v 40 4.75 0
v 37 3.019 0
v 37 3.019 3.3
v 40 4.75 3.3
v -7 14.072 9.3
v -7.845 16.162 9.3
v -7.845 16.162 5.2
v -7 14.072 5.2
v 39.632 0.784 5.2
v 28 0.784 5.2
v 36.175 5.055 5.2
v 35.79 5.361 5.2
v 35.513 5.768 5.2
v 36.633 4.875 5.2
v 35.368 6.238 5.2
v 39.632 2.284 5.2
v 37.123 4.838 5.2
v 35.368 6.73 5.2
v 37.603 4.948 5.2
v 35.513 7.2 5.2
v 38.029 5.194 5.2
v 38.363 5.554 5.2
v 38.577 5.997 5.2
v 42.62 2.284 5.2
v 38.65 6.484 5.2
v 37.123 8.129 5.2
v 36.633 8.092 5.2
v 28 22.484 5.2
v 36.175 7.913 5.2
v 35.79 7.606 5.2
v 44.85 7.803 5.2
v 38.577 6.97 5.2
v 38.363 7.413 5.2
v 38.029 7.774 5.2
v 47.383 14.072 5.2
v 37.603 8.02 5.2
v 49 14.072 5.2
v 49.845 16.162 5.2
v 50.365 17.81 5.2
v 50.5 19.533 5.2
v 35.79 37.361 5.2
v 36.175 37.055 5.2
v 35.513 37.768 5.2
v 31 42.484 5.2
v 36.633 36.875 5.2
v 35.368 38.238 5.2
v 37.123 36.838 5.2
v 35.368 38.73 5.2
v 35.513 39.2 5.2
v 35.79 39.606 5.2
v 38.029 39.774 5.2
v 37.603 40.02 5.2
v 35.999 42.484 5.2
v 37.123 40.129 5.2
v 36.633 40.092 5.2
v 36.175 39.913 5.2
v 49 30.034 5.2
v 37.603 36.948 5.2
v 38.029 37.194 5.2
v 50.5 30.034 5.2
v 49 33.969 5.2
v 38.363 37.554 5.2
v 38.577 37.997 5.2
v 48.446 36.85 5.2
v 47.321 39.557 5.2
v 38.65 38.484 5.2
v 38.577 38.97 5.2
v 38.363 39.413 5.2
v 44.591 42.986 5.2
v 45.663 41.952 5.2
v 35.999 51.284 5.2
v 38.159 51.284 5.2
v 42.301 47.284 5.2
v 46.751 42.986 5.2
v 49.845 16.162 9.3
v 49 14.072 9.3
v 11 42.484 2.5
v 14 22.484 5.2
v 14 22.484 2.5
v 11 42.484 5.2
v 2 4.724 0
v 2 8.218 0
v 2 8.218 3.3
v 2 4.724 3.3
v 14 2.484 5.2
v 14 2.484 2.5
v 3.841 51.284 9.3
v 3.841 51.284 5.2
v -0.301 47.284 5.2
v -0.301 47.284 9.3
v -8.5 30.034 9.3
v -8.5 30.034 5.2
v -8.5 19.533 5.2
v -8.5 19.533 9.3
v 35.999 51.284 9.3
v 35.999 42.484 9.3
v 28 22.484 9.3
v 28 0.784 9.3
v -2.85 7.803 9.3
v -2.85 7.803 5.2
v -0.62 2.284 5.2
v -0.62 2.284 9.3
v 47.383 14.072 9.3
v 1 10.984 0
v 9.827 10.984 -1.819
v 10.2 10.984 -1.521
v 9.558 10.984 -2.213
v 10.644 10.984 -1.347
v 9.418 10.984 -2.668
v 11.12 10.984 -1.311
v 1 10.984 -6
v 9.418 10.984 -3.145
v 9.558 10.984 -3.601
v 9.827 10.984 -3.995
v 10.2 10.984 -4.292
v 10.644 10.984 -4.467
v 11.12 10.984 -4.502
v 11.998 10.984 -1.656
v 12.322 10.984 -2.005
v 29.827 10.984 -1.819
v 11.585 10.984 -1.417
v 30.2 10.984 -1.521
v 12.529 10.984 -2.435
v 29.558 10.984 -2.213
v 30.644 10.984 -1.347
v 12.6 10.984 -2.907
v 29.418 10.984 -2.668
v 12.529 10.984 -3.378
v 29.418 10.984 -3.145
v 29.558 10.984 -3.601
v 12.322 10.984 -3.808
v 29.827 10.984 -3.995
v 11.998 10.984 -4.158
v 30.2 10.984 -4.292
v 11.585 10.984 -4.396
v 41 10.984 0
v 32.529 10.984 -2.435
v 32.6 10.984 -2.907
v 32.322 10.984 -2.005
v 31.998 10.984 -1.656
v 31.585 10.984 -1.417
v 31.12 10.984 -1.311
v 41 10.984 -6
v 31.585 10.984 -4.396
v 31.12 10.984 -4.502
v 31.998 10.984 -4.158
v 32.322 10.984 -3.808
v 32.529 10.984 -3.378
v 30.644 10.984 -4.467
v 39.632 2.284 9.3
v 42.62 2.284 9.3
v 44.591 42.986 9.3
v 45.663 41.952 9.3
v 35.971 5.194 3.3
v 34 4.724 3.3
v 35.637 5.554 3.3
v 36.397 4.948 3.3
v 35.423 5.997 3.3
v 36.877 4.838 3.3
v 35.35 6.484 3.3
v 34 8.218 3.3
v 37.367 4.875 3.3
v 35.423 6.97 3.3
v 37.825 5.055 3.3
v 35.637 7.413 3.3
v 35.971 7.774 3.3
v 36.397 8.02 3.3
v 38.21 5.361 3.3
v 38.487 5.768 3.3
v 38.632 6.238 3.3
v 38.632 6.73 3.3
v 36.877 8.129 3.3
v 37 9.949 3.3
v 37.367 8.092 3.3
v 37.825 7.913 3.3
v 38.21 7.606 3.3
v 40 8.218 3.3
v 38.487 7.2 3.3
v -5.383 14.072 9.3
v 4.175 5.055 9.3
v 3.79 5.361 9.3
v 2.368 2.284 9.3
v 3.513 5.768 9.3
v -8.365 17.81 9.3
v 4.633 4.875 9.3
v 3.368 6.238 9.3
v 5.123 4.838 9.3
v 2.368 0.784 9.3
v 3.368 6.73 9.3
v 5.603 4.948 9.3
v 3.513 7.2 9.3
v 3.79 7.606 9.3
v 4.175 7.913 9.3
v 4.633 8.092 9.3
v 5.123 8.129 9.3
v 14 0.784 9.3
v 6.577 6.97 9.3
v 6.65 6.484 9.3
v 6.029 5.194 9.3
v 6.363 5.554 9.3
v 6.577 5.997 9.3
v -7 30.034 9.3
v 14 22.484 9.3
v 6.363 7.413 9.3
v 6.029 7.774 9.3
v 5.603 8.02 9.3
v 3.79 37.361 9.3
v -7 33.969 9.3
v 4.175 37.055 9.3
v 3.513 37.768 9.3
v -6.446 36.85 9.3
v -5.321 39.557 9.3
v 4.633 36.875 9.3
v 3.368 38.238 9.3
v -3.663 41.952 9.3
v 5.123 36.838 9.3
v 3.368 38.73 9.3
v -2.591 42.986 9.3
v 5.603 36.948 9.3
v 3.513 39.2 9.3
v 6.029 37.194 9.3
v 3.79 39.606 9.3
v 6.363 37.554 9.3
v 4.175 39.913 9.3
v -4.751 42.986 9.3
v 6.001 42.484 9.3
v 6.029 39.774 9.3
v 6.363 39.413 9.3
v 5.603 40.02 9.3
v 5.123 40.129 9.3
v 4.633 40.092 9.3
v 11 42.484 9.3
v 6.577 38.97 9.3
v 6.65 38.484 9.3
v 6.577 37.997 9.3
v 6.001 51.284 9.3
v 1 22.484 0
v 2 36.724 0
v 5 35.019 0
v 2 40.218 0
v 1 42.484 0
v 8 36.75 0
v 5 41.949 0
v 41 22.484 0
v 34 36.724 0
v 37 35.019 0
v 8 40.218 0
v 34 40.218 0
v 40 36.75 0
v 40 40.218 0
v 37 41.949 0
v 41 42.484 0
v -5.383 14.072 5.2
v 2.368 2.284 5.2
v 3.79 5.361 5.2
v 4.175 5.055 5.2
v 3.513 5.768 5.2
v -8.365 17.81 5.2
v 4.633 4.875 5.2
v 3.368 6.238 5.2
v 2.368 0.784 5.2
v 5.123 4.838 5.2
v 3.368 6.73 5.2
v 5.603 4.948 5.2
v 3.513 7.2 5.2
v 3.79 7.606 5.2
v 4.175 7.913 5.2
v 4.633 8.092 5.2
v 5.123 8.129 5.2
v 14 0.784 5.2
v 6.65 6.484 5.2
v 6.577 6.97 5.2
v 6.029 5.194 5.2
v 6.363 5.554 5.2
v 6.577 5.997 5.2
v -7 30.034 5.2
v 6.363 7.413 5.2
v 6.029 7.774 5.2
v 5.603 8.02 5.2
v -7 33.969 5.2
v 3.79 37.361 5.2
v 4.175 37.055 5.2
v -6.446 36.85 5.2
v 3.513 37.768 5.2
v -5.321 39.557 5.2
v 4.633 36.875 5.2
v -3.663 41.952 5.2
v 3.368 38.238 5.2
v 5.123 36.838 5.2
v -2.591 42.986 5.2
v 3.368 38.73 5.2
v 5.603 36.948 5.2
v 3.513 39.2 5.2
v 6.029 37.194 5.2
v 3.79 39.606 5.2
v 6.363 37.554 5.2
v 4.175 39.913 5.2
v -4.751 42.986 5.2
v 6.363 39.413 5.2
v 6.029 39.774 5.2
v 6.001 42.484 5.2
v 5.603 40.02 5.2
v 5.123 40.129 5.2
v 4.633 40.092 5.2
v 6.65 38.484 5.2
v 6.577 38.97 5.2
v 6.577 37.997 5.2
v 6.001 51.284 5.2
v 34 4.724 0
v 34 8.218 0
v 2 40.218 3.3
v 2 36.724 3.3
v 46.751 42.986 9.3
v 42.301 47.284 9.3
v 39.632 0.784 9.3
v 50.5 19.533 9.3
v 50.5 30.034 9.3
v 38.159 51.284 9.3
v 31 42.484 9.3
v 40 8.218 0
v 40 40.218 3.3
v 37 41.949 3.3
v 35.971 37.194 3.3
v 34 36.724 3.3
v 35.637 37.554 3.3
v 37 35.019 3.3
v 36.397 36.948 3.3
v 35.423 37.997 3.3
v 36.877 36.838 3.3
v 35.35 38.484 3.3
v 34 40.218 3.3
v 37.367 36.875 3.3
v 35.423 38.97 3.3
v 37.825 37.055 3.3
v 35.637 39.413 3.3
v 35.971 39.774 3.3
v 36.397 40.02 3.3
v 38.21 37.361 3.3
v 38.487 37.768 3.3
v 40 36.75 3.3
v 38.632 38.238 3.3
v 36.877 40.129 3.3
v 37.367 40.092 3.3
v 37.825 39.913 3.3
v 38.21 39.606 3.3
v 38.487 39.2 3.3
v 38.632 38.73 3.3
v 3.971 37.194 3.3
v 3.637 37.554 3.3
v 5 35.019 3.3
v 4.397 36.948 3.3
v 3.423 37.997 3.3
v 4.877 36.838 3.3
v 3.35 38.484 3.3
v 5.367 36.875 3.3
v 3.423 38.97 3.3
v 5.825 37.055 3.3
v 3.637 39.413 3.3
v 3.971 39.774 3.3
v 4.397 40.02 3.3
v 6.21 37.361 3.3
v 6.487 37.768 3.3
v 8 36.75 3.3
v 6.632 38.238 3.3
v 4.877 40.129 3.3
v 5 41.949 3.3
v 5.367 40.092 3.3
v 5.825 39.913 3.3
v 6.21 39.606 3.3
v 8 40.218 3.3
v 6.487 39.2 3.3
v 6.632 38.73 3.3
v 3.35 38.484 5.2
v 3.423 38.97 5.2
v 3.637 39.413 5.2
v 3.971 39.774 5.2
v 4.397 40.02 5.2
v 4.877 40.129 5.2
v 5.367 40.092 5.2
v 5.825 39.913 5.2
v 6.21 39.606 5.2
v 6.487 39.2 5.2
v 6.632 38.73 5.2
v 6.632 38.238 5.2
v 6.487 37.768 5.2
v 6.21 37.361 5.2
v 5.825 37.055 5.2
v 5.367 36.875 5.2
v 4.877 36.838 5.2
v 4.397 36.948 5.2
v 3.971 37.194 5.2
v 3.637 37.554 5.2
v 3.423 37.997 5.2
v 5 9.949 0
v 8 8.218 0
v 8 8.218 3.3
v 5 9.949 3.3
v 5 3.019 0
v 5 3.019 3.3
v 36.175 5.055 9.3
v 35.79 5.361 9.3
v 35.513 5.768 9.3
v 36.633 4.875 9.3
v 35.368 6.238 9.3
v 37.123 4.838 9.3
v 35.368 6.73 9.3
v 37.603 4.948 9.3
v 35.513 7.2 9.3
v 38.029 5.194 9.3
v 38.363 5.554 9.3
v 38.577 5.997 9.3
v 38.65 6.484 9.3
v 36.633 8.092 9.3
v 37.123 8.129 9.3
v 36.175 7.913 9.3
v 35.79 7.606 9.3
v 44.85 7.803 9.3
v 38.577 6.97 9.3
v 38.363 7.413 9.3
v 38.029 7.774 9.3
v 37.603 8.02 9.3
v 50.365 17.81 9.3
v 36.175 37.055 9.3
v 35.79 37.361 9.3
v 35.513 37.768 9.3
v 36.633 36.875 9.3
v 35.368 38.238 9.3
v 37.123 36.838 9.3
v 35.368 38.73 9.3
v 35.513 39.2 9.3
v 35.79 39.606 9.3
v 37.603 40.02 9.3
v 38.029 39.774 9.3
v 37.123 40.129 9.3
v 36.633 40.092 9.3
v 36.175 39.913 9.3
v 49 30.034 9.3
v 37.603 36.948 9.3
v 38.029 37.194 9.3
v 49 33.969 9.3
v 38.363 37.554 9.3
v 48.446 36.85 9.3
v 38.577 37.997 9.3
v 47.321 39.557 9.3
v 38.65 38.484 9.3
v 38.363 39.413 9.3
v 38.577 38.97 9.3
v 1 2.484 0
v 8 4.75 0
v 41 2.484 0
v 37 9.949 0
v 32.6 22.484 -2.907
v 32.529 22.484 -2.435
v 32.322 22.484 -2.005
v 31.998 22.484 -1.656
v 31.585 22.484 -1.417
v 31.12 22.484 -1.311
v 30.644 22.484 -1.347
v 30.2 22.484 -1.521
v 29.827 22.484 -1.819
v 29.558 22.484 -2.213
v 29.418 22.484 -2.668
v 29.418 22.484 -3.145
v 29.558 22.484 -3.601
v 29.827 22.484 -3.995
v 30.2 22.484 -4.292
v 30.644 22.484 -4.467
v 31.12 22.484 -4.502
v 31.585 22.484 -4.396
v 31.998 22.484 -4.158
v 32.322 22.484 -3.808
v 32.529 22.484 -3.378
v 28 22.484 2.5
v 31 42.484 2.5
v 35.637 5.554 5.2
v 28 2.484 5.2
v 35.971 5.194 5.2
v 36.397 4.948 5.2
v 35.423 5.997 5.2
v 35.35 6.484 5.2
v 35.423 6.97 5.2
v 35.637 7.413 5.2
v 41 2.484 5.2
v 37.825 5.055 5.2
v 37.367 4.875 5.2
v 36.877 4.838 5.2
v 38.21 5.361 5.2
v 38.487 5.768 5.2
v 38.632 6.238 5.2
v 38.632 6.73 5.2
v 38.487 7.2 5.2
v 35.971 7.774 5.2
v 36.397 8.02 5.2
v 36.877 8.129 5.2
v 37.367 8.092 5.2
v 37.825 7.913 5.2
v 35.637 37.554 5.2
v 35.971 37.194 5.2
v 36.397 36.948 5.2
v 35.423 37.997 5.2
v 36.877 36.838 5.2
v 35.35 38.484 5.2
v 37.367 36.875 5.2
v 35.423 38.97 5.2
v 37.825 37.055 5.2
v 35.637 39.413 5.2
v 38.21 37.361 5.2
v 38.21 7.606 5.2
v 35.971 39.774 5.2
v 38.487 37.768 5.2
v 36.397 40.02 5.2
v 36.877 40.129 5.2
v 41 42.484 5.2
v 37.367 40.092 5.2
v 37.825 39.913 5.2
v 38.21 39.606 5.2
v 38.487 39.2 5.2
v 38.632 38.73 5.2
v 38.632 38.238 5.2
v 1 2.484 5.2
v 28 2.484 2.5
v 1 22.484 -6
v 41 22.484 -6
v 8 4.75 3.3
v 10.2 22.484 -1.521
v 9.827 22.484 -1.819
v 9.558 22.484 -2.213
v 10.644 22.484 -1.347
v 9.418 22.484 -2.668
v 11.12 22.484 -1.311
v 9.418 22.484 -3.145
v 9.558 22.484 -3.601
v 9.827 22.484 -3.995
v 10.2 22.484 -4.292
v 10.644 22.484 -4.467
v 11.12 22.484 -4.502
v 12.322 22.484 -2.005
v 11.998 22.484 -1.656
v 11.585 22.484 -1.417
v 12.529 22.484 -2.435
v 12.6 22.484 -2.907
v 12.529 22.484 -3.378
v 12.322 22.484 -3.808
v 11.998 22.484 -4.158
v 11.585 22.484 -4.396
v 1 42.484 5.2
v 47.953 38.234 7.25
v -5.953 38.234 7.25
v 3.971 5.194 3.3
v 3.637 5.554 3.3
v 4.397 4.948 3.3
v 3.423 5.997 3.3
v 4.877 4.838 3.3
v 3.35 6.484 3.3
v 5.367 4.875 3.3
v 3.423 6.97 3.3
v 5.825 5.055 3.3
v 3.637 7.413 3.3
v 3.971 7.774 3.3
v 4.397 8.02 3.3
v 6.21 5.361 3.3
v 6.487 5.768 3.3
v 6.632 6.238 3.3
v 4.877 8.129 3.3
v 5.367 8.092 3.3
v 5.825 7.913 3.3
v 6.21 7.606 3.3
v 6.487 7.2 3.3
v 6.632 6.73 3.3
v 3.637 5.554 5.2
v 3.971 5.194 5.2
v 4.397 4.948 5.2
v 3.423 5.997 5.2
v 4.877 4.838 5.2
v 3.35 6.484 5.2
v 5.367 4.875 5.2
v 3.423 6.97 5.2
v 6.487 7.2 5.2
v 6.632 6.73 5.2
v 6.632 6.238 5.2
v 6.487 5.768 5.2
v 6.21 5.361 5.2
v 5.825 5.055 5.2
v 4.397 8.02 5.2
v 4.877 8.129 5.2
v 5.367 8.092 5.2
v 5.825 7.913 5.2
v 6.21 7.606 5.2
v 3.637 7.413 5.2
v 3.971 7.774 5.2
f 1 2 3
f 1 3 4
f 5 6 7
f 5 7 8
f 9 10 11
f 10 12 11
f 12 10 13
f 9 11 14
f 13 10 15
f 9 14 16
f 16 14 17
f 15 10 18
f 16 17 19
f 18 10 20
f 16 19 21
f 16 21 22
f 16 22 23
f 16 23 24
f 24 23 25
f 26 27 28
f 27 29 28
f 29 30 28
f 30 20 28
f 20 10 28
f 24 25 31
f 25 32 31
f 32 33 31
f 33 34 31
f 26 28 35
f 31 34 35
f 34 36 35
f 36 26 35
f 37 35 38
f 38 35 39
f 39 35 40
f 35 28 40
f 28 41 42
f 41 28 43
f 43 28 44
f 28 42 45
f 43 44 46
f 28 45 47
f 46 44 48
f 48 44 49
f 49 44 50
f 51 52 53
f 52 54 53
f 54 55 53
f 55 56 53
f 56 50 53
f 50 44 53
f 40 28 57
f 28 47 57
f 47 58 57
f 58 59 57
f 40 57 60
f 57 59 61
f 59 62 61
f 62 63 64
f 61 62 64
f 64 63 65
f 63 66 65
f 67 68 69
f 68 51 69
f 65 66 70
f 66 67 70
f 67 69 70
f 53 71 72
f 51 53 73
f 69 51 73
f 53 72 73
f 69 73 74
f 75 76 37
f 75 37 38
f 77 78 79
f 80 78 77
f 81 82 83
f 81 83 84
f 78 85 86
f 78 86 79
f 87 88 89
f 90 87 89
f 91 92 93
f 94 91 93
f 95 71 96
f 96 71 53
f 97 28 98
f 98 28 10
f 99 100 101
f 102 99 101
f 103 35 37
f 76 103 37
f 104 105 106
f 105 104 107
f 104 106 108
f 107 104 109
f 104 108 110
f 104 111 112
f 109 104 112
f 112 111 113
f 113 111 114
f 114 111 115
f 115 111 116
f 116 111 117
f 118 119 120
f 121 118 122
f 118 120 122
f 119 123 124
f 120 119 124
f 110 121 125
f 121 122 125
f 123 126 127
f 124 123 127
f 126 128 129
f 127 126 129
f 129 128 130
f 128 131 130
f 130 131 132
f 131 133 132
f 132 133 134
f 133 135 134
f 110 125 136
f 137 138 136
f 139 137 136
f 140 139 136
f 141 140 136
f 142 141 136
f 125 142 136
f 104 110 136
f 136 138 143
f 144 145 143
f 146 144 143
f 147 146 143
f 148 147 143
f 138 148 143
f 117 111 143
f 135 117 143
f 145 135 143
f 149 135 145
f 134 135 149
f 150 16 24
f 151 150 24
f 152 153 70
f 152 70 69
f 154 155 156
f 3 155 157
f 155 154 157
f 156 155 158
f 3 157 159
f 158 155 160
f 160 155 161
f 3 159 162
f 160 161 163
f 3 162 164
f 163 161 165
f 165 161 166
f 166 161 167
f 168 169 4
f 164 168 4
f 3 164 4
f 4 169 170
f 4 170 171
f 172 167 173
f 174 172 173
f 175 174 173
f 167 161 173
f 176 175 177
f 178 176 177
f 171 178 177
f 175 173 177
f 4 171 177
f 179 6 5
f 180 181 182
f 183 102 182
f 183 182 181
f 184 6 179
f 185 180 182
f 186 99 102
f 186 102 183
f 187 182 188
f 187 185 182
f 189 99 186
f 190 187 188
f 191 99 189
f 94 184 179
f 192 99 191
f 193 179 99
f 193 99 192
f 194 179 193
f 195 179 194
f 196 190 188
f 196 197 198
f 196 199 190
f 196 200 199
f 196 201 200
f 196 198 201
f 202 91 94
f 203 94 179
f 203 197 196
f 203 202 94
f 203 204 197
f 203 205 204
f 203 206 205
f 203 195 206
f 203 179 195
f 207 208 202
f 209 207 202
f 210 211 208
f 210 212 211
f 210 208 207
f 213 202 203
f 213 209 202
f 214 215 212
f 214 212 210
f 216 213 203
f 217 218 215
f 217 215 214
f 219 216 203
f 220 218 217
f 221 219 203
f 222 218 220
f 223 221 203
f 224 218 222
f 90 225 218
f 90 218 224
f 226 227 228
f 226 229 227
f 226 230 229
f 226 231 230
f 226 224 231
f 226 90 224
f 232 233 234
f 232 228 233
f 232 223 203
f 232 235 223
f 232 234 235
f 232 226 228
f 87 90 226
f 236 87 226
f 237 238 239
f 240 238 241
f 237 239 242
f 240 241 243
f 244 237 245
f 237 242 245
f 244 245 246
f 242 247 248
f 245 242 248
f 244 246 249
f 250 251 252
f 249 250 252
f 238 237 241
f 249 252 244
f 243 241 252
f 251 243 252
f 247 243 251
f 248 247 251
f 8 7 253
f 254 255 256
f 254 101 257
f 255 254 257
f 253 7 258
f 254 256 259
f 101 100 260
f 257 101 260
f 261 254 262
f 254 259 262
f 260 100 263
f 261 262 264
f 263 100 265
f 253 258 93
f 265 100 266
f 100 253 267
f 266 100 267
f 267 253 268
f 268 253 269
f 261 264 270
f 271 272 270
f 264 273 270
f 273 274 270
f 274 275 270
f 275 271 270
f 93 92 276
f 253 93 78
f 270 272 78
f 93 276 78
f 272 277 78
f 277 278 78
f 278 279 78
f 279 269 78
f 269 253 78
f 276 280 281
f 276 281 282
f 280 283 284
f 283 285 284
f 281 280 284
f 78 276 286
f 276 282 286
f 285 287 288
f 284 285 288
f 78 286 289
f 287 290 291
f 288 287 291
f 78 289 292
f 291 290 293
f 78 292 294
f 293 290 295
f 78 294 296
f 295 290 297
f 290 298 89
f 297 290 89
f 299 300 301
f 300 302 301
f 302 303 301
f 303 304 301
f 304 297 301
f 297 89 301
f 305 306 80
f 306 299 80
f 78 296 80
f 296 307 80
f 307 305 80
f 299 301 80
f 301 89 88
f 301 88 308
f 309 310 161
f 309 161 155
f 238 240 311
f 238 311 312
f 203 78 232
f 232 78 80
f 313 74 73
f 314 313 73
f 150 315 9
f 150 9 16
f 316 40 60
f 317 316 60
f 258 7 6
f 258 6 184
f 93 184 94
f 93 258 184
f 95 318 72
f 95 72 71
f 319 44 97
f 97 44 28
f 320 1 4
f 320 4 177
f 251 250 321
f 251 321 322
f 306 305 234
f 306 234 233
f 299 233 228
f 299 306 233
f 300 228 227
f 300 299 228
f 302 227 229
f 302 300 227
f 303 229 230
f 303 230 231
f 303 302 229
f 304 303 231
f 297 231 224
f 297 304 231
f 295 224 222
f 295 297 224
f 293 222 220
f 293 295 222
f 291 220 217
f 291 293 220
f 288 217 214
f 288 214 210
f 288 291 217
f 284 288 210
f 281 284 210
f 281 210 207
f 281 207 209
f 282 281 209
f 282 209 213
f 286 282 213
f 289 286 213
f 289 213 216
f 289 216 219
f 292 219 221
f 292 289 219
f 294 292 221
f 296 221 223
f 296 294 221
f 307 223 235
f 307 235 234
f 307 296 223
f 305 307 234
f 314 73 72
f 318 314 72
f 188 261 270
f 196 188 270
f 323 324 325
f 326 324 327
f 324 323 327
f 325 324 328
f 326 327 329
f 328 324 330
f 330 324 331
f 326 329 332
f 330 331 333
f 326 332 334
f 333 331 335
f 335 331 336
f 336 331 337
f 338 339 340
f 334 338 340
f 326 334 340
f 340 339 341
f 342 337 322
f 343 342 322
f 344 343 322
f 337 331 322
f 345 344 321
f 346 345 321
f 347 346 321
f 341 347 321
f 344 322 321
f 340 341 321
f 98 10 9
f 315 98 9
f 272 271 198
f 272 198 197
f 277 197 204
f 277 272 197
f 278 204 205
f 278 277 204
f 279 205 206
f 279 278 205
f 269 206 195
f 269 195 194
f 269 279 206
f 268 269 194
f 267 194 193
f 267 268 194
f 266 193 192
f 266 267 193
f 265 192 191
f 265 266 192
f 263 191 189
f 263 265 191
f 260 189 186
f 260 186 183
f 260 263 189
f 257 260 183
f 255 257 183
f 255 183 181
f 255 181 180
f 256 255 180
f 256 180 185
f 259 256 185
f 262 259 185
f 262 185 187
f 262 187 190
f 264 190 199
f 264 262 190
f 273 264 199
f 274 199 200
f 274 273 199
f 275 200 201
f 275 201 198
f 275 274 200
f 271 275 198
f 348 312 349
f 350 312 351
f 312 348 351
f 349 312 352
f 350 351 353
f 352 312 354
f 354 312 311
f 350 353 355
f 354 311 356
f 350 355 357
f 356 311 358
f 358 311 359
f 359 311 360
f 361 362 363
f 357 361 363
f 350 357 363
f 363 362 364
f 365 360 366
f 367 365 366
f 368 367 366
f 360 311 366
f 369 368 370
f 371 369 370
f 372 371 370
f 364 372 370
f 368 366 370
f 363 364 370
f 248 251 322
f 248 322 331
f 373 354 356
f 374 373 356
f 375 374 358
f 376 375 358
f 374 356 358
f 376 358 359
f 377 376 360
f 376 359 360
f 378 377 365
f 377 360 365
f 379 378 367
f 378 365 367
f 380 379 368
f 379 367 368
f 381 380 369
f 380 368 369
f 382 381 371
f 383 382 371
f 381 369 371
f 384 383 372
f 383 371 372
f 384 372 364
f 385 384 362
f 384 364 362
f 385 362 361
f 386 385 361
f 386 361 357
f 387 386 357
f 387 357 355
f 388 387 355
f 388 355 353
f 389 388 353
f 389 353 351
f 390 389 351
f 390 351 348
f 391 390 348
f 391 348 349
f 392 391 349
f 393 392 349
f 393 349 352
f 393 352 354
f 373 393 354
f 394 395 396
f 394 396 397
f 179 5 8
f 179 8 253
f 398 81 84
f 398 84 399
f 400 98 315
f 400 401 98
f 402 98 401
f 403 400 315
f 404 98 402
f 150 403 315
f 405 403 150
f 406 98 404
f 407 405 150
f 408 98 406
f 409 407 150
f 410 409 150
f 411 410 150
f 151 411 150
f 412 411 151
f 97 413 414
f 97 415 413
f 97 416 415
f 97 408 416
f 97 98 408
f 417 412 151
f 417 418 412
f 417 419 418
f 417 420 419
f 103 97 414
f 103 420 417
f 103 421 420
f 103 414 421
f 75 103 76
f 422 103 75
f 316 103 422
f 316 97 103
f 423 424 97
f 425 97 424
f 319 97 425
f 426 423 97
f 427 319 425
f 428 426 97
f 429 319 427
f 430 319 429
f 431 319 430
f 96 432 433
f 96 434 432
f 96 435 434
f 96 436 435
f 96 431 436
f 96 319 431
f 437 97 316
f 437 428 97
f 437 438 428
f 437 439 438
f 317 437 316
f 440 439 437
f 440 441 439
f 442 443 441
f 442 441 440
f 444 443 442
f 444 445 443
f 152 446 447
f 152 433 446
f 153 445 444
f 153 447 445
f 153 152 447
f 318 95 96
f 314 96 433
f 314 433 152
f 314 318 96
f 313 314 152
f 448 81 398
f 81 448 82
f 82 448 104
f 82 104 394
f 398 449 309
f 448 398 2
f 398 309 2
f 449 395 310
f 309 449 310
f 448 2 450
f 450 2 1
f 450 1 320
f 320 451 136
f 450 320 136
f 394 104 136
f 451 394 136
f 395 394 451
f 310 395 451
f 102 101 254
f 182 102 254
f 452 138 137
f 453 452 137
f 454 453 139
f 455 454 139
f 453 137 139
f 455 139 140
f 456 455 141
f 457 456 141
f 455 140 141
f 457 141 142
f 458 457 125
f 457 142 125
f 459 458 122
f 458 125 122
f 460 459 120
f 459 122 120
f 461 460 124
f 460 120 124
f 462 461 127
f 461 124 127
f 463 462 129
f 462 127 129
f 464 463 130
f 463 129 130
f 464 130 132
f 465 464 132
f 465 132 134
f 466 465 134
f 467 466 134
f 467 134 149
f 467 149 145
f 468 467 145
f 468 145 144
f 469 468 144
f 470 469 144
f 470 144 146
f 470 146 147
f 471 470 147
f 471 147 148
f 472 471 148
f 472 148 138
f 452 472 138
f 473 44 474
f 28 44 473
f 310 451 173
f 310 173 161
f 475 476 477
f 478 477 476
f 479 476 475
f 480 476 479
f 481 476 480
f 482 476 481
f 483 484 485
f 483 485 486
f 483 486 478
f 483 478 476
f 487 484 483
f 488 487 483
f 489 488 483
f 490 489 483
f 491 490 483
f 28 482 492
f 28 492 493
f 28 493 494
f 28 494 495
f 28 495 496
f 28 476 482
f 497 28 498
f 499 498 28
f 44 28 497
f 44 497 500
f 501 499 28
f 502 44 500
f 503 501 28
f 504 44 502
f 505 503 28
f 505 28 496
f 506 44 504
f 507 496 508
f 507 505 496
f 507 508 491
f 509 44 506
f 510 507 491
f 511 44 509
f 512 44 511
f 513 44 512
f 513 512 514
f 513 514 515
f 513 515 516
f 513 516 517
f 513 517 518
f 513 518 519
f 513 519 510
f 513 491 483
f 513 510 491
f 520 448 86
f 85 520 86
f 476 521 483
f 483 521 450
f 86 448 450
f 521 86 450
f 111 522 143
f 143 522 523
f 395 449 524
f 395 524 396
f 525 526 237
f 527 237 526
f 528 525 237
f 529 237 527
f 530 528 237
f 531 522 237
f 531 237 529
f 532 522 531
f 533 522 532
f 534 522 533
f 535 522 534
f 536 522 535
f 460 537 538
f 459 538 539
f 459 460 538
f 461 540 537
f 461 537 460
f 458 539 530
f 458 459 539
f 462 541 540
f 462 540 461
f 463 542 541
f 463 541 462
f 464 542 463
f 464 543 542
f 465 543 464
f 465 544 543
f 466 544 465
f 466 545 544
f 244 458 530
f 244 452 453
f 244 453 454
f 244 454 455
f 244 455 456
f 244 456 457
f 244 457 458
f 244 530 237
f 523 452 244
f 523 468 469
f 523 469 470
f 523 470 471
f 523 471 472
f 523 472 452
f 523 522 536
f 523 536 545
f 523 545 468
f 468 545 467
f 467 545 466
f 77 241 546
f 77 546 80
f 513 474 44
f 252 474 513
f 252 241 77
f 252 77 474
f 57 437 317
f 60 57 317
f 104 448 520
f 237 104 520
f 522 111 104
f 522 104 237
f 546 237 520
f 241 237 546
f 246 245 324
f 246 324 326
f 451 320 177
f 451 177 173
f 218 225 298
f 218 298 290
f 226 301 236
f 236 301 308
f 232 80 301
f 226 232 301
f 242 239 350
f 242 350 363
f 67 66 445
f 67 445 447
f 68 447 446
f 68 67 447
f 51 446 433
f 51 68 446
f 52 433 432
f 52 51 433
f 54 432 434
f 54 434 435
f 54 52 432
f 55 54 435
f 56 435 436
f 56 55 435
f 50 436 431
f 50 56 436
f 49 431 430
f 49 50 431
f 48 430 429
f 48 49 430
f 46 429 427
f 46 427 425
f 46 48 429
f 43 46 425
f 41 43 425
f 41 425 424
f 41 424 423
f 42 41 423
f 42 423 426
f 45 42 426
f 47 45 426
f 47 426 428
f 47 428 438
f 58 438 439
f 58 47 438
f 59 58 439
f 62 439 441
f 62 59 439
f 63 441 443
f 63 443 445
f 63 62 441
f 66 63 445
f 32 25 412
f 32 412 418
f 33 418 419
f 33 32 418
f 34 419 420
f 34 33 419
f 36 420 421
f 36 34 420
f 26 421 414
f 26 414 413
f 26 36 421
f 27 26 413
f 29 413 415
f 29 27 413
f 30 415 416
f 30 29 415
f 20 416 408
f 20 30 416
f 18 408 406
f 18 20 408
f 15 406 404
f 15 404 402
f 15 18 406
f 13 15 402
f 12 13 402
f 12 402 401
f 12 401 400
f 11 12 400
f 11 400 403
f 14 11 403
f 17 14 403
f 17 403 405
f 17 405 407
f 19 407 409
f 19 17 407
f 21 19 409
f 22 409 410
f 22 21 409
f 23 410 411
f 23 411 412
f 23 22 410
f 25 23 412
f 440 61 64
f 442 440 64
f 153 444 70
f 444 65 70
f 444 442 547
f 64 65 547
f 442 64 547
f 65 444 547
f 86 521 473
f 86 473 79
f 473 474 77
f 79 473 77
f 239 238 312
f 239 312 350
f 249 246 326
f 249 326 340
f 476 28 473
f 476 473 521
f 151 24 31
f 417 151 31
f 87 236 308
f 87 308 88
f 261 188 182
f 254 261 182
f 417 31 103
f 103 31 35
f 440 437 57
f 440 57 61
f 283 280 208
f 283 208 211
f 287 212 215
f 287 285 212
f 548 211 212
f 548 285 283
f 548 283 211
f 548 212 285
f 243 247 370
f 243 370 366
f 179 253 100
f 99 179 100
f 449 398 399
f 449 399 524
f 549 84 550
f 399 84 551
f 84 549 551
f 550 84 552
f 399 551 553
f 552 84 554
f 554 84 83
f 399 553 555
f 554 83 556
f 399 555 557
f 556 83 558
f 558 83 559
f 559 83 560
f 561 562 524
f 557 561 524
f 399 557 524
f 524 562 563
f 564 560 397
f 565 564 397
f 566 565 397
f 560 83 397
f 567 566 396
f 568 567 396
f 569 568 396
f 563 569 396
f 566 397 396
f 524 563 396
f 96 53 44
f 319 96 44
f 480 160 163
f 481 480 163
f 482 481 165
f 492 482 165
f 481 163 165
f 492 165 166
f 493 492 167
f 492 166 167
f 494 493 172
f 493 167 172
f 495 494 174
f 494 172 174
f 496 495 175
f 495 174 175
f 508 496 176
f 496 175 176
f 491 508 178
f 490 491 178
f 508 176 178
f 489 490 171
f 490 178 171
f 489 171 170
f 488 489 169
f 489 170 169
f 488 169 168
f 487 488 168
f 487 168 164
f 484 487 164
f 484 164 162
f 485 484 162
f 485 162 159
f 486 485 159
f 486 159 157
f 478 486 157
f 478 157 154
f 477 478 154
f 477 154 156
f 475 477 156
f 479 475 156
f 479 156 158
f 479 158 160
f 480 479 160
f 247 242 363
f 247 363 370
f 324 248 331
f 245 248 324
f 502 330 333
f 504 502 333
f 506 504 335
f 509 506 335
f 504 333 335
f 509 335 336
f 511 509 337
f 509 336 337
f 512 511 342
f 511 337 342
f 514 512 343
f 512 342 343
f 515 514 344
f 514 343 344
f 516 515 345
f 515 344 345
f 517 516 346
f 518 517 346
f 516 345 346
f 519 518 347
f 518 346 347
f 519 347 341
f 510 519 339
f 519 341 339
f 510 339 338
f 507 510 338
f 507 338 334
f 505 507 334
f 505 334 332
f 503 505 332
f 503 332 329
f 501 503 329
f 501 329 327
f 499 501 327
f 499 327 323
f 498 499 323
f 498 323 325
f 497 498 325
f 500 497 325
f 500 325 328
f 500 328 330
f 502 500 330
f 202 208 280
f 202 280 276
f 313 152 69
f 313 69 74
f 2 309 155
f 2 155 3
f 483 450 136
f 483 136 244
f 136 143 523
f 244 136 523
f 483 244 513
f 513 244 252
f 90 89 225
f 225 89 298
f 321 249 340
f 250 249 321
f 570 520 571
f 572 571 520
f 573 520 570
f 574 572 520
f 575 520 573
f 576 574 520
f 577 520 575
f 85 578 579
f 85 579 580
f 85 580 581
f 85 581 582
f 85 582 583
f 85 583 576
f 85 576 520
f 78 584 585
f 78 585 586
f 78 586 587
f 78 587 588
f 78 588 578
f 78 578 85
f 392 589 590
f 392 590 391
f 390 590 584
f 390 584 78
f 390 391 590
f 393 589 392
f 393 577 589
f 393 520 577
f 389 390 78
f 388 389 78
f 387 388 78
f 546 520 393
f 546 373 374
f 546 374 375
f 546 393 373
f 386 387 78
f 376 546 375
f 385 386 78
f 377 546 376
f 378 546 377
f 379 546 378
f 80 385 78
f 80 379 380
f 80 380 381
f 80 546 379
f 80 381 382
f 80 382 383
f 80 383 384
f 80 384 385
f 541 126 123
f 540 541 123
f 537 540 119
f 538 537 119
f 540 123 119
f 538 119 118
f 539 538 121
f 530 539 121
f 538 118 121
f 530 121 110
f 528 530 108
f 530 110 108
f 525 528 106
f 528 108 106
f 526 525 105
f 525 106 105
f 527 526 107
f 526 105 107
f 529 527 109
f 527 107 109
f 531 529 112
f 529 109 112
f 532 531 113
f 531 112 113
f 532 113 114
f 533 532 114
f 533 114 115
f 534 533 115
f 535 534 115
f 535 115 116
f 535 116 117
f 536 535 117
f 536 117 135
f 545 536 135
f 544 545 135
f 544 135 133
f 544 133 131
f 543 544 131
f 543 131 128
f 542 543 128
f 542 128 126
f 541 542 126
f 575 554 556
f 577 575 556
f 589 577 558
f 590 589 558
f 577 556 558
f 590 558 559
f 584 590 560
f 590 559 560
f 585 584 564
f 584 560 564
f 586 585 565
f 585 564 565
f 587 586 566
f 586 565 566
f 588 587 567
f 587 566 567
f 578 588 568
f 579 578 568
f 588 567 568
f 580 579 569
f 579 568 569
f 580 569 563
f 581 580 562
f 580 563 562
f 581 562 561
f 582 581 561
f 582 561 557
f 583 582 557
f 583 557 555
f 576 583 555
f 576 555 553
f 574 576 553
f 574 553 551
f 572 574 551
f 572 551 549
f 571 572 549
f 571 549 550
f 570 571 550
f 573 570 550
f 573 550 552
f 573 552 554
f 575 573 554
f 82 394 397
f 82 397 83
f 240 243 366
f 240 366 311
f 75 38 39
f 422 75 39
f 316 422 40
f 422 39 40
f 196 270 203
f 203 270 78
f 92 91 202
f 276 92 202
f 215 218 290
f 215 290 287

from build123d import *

# Parameters (mm, degrees)
SKETCH1_W                 = 40
SKETCH1_H                 = 40
BOSS_EXTRUDE1_DEPTH       = 5.2
SKETCH2_W                 = 40
SKETCH2_H                 = 11.5
BOSS_EXTRUDE2_DEPTH       = 6
SKETCH3_R                 = 1.6
CUT_EXTRUDE1_DEPTH        = 37.483333333
SKETCH4_R                 = 1.65
CUT_EXTRUDE2_DEPTH        = 5.2
CUT_EXTRUDE3_DEPTH        = 3.3
LPATTERN1_COUNT           = 2
LPATTERN1_PITCH           = 32
LPATTERN2_COUNT           = 2
LPATTERN2_PITCH           = 32
LPATTERN2_COPY_1_SKETCH_R = 1.65
LPATTERN2_COPY_1_DEPTH    = 5.2
LPATTERN2_COPY_2_DEPTH    = 3.3
CUT_EXTRUDE4_DEPTH        = 2.7
SKETCH6_3_R               = 1.65
SKETCH6_3_W               = 7
SKETCH6_3_H               = 1.5
SKETCH6_3_W_2             = 1.5
SKETCH6_3_H_2             = 7.501154436
BOSS_EXTRUDE3_DEPTH       = 4.1


with BuildPart() as part:
    # Sketch1 → Boss-Extrude1 (new body)
    with BuildSketch(Plane.XY):
        with Locations((21, 22.483732861)):
            Rectangle(SKETCH1_W, SKETCH1_H)
    extrude(amount=BOSS_EXTRUDE1_DEPTH)

    # Sketch2 → Boss-Extrude2 (add)
    with BuildSketch(Plane.XY.offset(-6)):
        with Locations((21, 16.733732861)):
            Rectangle(SKETCH2_W, SKETCH2_H)
    extrude(amount=BOSS_EXTRUDE2_DEPTH)

    # Sketch3 → Cut-Extrude1 (cut)
    with BuildSketch(Plane.XZ.offset(-5.000399528)):
        with Locations((11, -2.906796507)):
            Circle(SKETCH3_R)
        with Locations((31, -2.906796507)):
            Circle(SKETCH3_R)
    extrude(amount=-CUT_EXTRUDE1_DEPTH, mode=Mode.SUBTRACT)

    # Sketch4 → Cut-Extrude2 (cut)
    with BuildSketch(Plane(origin=(0, 0, 0), x_dir=(-1, 0, 0), z_dir=(0, 0, -1))):
        with Locations((-5, 6.483732861)):
            Circle(SKETCH4_R)
    cut_extrude2 = extrude(amount=-CUT_EXTRUDE2_DEPTH, mode=Mode.SUBTRACT)

    # Sketch1<3> → Cut-Extrude3 (cut)
    with BuildSketch(Plane.XY):
        Polygon((2, 4.723517403), (5, 3.018732861), (8, 4.749885982), (8, 8.21757974), (5, 9.948732861), (2, 8.21757974), align=None)
    cut_extrude3 = extrude(amount=CUT_EXTRUDE3_DEPTH, mode=Mode.SUBTRACT)

    # LPattern1: Cut-Extrude2, Cut-Extrude3 ×2
    with Locations(*[(i * LPATTERN1_PITCH, 0, 0) for i in range(1, LPATTERN1_COUNT)]):
        add(cut_extrude2, mode=Mode.SUBTRACT)
        add(cut_extrude3, mode=Mode.SUBTRACT)

    # LPattern2: Cut-Extrude2, Cut-Extrude3 ×2
    with Locations(*[(0, i * LPATTERN2_PITCH, 0) for i in range(1, LPATTERN2_COUNT)]):
        add(cut_extrude2, mode=Mode.SUBTRACT)
        add(cut_extrude3, mode=Mode.SUBTRACT)

    # LPattern2 copy 1 sketch → LPattern2 copy 1 (cut)
    with BuildSketch(Plane(origin=(32, 32, 0), x_dir=(-1, 0, 0), z_dir=(0, 0, -1))):
        with Locations((-5, 6.483732861)):
            Circle(LPATTERN2_COPY_1_SKETCH_R)
    extrude(amount=-LPATTERN2_COPY_1_DEPTH, mode=Mode.SUBTRACT)

    # LPattern2 copy 2 sketch → LPattern2 copy 2 (cut)
    with BuildSketch(Plane(origin=(32, 32, 0), x_dir=(1, 0, 0), z_dir=(0, 0, 1))):
        Polygon((2, 4.723517403), (5, 3.018732861), (8, 4.749885982), (8, 8.21757974), (5, 9.948732861), (2, 8.21757974), align=None)
    extrude(amount=LPATTERN2_COPY_2_DEPTH, mode=Mode.SUBTRACT)

    # Sketch6 → Cut-Extrude4 (cut)
    with BuildSketch(Plane.XY.offset(5.2)):
        Polygon((14, 2.483732861), (14, 22.483732861), (11, 42.483732861), (31, 42.483732861), (28, 22.483732861), (28, 2.483732861), align=None)
    extrude(amount=-CUT_EXTRUDE4_DEPTH, mode=Mode.SUBTRACT)


with BuildPart() as body_2:
    # Sketch6<3> → Boss-Extrude3 (new body)
    with BuildSketch(Plane.XY.offset(5.2)):
        Polygon((12.5, 2.483732861), (14, 2.483732861), (14, 22.483732861), (11, 42.483732861), (6.000729911, 42.483732861), (4.500729911, 42.483732861), (1, 42.483732861), (1, 2.483732861), align=None)
        with Locations((5, 6.483732861)):
            Circle(SKETCH6_3_R, mode=Mode.SUBTRACT)
        with Locations((5, 38.483732861)):
            Circle(SKETCH6_3_R, mode=Mode.SUBTRACT)
        Polygon((14, 0.783732861), (14, 2.483732861), (12.5, 2.483732861), (12.5, 2.283732861), (9.368445839, 2.283732861), (9.368445839, 0.783732861), align=None)
        Polygon((29.5, 2.483732861), (28, 2.483732861), (28, 0.783732861), (32.631554161, 0.783732861), (32.631554161, 2.283732861), (29.5, 2.283732861), align=None)
        Polygon((28, 22.483732861), (28, 2.483732861), (29.5, 2.483732861), (41, 2.483732861), (41, 42.483732861), (37.499270089, 42.483732861), (35.999270089, 42.483732861), (31, 42.483732861), align=None)
        with Locations((37, 6.483732861)):
            Circle(SKETCH6_3_R, mode=Mode.SUBTRACT)
        with Locations((37, 38.483732861)):
            Circle(SKETCH6_3_R, mode=Mode.SUBTRACT)
        with BuildLine():
            Line((12.5, 2.283732861), (12.5, 2.483732861))
            Line((12.5, 2.483732861), (1, 2.483732861))
            Line((1, 2.483732861), (1, 42.483732861))
            Line((1, 42.483732861), (4.500729911, 42.483732861))
            Line((4.500729911, 42.483732861), (4.500729911, 49.783732861))
            Line((4.500729911, 49.783732861), (4.447434441, 49.783732861))
            Line((4.447434441, 49.783732861), (1.858608656, 47.283732861))
            Line((1.858608656, 47.283732861), (-2.591394921, 42.986414359))
            Line((-2.591394921, 42.986414359), (-3.662956957, 41.951618929))
            add(Edge.make_bspline(
                [(-7, 33.969294903), (-6.870140729, 35.427391096), (-6.161424767, 38.328027166), (-4.617817273, 40.853318284), (-3.662956957, 41.951618929)],
                knots=[0.006919491, 0.006919491, 0.006919491, 0.006919491, 0.500067263, 0.993215035, 0.993215035, 0.993215035, 0.993215035], degree=3))
            Line((-7, 33.969294903), (-7, 30.034310079))
            Line((-7, 30.034310079), (-7, 22.533155643))
            Line((-7, 22.533155643), (-7, 19.486513051))
            add(Edge.make_bspline(
                [(-6.453878909, 16.723606193), (-6.550035771, 16.961602777), (-6.732637504, 17.457071628), (-6.915191313, 18.140873432), (-6.997225272, 18.69458891), (-7.013036312, 19.085155681), (-7.01063743, 19.3023473), (-7.003738635, 19.426454967), (-7, 19.486513051)],
                knots=[0, 0, 0, 0, 0.253262039, 0.506524078, 0.759786116, 0.886417136, 0.949732645, 1.013048155, 1.013048155, 1.013048155, 1.013048155], degree=3))
            Line((-6.453878909, 16.723606193), (-5.382540429, 14.071950405))
            Line((-5.382540429, 14.071950405), (-2.849612404, 7.802733549))
            Line((-2.849612404, 7.802733549), (-0.619791386, 2.283732861))
            Line((-0.619791386, 2.283732861), (2.368445839, 2.283732861))
            Line((2.368445839, 2.283732861), (9.368445839, 2.283732861))
            Line((9.368445839, 2.283732861), (12.5, 2.283732861))
        make_face()
        with BuildLine():
            Line((41, 2.483732861), (29.5, 2.483732861))
            Line((29.5, 2.483732861), (29.5, 2.283732861))
            Line((29.5, 2.283732861), (32.631554161, 2.283732861))
            Line((32.631554161, 2.283732861), (39.631554161, 2.283732861))
            Line((39.631554161, 2.283732861), (42.619791386, 2.283732861))
            Line((42.619791386, 2.283732861), (44.849612404, 7.802733549))
            Line((44.849612404, 7.802733549), (47.382540429, 14.071950405))
            Line((47.382540429, 14.071950405), (48.453878909, 16.723606193))
            add(Edge.make_bspline(
                [(48.453878909, 16.723606193), (48.550035771, 16.961602777), (48.732637504, 17.457071628), (48.915191313, 18.140873432), (48.997225272, 18.69458891), (49.013036312, 19.085155681), (49.01063743, 19.3023473), (49.003738635, 19.426454967), (49, 19.486513051)],
                knots=[0, 0, 0, 0, 0.253262039, 0.506524078, 0.759786116, 0.886417136, 0.949732645, 1.013048155, 1.013048155, 1.013048155, 1.013048155], degree=3))
            Line((49, 19.486513051), (49, 22.533155643))
            Line((49, 22.533155643), (49, 30.034310079))
            Line((49, 30.034310079), (49, 33.969294903))
            add(Edge.make_bspline(
                [(49, 33.969294903), (48.870140729, 35.427391096), (48.161424767, 38.328027166), (46.617817273, 40.853318284), (45.662956957, 41.951618929)],
                knots=[0.006919491, 0.006919491, 0.006919491, 0.006919491, 0.500067263, 0.993215035, 0.993215035, 0.993215035, 0.993215035], degree=3))
            Line((45.662956957, 41.951618929), (44.591394921, 42.986414359))
            Line((44.591394921, 42.986414359), (40.141391344, 47.283732861))
            Line((40.141391344, 47.283732861), (37.552565559, 49.783732861))
            Line((37.552565559, 49.783732861), (37.499270089, 49.783732861))
            Line((37.499270089, 49.783732861), (37.499270089, 42.483732861))
            Line((37.499270089, 42.483732861), (41, 42.483732861))
            Line((41, 42.483732861), (41, 2.483732861))
        make_face()
        with Locations((5.868445839, 1.533732861)):
            Rectangle(SKETCH6_3_W, SKETCH6_3_H)
        Polygon((4.500729911, 42.483732861), (6.000729911, 42.483732861), (6.000729911, 51.283732861), (3.841395102, 51.283732861), (-0.300726153, 47.283732861), (1.858608656, 47.283732861), (4.447434441, 49.783732861), (4.500729911, 49.783732861), align=None)
        with Locations((36.131554161, 1.533732861)):
            Rectangle(SKETCH6_3_W, SKETCH6_3_H)
        Polygon((35.999270089, 51.283732861), (35.999270089, 42.483732861), (37.499270089, 42.483732861), (37.499270089, 49.783732861), (37.552565559, 49.783732861), (40.141391344, 47.283732861), (42.300726153, 47.283732861), (38.158604898, 51.283732861), align=None)
        Polygon((1.858608656, 47.283732861), (-0.300726153, 47.283732861), (-4.75072973, 42.986414359), (-2.591394921, 42.986414359), align=None)
        with BuildLine():
            Line((-7.844654691, 16.161696302), (-7.000342543, 14.071950405))
            Line((-7.000342543, 14.071950405), (-5.382540429, 14.071950405))
            Line((-5.382540429, 14.071950405), (-6.453878909, 16.723606193))
            add(Edge.make_bspline(
                [(-6.453878909, 16.723606193), (-6.550035771, 16.961602777), (-6.732637504, 17.457071628), (-6.915191313, 18.140873432), (-6.997225272, 18.69458891), (-7.013036312, 19.085155681), (-7.01063743, 19.3023473), (-7.003738635, 19.426454967), (-7, 19.486513051)],
                knots=[0, 0, 0, 0, 0.253262039, 0.506524078, 0.759786116, 0.886417136, 0.949732645, 1.013048155, 1.013048155, 1.013048155, 1.013048155], degree=3))
            Line((-7, 19.486513051), (-7, 22.533155643))
            Line((-7, 22.533155643), (-8.5, 22.533155643))
            Line((-8.5, 22.533155643), (-8.5, 19.533155643))
            add(Edge.make_bspline(
                [(-7.844654691, 16.161696302), (-7.855523466, 16.188597464), (-8.291591299, 17.277219009), (-8.572201451, 18.373298795), (-8.5, 19.533155643)],
                knots=[0, 0, 0, 0, 0.024714148, 1, 1, 1, 1], degree=3))
        make_face()
        Polygon((46.75072973, 42.986414359), (42.300726153, 47.283732861), (40.141391344, 47.283732861), (44.591394921, 42.986414359), align=None)
        with BuildLine():
            Line((47.382540429, 14.071950405), (49.000342543, 14.071950405))
            Line((49.000342543, 14.071950405), (49.844654691, 16.161696302))
            add(Edge.make_bspline(
                [(49.844654691, 16.161696302), (49.855523466, 16.188597464), (50.291591299, 17.277219009), (50.572201451, 18.373298795), (50.5, 19.533155643)],
                knots=[0, 0, 0, 0, 0.024714148, 1, 1, 1, 1], degree=3))
            Line((50.5, 19.533155643), (50.5, 22.533155643))
            Line((50.5, 22.533155643), (49, 22.533155643))
            Line((49, 22.533155643), (49, 19.486513051))
            add(Edge.make_bspline(
                [(48.453878909, 16.723606193), (48.550035771, 16.961602777), (48.732637504, 17.457071628), (48.915191313, 18.140873432), (48.997225272, 18.69458891), (49.013036312, 19.085155681), (49.01063743, 19.3023473), (49.003738635, 19.426454967), (49, 19.486513051)],
                knots=[0, 0, 0, 0, 0.253262039, 0.506524078, 0.759786116, 0.886417136, 0.949732645, 1.013048155, 1.013048155, 1.013048155, 1.013048155], degree=3))
            Line((48.453878909, 16.723606193), (47.382540429, 14.071950405))
        make_face()
        with Locations((-7.75, 26.283732861)):
            Rectangle(SKETCH6_3_W_2, SKETCH6_3_H_2)
        with Locations((49.75, 26.283732861)):
            Rectangle(SKETCH6_3_W_2, SKETCH6_3_H_2)
    extrude(amount=BOSS_EXTRUDE3_DEPTH)


solid = Compound([part.part, body_2.part])
